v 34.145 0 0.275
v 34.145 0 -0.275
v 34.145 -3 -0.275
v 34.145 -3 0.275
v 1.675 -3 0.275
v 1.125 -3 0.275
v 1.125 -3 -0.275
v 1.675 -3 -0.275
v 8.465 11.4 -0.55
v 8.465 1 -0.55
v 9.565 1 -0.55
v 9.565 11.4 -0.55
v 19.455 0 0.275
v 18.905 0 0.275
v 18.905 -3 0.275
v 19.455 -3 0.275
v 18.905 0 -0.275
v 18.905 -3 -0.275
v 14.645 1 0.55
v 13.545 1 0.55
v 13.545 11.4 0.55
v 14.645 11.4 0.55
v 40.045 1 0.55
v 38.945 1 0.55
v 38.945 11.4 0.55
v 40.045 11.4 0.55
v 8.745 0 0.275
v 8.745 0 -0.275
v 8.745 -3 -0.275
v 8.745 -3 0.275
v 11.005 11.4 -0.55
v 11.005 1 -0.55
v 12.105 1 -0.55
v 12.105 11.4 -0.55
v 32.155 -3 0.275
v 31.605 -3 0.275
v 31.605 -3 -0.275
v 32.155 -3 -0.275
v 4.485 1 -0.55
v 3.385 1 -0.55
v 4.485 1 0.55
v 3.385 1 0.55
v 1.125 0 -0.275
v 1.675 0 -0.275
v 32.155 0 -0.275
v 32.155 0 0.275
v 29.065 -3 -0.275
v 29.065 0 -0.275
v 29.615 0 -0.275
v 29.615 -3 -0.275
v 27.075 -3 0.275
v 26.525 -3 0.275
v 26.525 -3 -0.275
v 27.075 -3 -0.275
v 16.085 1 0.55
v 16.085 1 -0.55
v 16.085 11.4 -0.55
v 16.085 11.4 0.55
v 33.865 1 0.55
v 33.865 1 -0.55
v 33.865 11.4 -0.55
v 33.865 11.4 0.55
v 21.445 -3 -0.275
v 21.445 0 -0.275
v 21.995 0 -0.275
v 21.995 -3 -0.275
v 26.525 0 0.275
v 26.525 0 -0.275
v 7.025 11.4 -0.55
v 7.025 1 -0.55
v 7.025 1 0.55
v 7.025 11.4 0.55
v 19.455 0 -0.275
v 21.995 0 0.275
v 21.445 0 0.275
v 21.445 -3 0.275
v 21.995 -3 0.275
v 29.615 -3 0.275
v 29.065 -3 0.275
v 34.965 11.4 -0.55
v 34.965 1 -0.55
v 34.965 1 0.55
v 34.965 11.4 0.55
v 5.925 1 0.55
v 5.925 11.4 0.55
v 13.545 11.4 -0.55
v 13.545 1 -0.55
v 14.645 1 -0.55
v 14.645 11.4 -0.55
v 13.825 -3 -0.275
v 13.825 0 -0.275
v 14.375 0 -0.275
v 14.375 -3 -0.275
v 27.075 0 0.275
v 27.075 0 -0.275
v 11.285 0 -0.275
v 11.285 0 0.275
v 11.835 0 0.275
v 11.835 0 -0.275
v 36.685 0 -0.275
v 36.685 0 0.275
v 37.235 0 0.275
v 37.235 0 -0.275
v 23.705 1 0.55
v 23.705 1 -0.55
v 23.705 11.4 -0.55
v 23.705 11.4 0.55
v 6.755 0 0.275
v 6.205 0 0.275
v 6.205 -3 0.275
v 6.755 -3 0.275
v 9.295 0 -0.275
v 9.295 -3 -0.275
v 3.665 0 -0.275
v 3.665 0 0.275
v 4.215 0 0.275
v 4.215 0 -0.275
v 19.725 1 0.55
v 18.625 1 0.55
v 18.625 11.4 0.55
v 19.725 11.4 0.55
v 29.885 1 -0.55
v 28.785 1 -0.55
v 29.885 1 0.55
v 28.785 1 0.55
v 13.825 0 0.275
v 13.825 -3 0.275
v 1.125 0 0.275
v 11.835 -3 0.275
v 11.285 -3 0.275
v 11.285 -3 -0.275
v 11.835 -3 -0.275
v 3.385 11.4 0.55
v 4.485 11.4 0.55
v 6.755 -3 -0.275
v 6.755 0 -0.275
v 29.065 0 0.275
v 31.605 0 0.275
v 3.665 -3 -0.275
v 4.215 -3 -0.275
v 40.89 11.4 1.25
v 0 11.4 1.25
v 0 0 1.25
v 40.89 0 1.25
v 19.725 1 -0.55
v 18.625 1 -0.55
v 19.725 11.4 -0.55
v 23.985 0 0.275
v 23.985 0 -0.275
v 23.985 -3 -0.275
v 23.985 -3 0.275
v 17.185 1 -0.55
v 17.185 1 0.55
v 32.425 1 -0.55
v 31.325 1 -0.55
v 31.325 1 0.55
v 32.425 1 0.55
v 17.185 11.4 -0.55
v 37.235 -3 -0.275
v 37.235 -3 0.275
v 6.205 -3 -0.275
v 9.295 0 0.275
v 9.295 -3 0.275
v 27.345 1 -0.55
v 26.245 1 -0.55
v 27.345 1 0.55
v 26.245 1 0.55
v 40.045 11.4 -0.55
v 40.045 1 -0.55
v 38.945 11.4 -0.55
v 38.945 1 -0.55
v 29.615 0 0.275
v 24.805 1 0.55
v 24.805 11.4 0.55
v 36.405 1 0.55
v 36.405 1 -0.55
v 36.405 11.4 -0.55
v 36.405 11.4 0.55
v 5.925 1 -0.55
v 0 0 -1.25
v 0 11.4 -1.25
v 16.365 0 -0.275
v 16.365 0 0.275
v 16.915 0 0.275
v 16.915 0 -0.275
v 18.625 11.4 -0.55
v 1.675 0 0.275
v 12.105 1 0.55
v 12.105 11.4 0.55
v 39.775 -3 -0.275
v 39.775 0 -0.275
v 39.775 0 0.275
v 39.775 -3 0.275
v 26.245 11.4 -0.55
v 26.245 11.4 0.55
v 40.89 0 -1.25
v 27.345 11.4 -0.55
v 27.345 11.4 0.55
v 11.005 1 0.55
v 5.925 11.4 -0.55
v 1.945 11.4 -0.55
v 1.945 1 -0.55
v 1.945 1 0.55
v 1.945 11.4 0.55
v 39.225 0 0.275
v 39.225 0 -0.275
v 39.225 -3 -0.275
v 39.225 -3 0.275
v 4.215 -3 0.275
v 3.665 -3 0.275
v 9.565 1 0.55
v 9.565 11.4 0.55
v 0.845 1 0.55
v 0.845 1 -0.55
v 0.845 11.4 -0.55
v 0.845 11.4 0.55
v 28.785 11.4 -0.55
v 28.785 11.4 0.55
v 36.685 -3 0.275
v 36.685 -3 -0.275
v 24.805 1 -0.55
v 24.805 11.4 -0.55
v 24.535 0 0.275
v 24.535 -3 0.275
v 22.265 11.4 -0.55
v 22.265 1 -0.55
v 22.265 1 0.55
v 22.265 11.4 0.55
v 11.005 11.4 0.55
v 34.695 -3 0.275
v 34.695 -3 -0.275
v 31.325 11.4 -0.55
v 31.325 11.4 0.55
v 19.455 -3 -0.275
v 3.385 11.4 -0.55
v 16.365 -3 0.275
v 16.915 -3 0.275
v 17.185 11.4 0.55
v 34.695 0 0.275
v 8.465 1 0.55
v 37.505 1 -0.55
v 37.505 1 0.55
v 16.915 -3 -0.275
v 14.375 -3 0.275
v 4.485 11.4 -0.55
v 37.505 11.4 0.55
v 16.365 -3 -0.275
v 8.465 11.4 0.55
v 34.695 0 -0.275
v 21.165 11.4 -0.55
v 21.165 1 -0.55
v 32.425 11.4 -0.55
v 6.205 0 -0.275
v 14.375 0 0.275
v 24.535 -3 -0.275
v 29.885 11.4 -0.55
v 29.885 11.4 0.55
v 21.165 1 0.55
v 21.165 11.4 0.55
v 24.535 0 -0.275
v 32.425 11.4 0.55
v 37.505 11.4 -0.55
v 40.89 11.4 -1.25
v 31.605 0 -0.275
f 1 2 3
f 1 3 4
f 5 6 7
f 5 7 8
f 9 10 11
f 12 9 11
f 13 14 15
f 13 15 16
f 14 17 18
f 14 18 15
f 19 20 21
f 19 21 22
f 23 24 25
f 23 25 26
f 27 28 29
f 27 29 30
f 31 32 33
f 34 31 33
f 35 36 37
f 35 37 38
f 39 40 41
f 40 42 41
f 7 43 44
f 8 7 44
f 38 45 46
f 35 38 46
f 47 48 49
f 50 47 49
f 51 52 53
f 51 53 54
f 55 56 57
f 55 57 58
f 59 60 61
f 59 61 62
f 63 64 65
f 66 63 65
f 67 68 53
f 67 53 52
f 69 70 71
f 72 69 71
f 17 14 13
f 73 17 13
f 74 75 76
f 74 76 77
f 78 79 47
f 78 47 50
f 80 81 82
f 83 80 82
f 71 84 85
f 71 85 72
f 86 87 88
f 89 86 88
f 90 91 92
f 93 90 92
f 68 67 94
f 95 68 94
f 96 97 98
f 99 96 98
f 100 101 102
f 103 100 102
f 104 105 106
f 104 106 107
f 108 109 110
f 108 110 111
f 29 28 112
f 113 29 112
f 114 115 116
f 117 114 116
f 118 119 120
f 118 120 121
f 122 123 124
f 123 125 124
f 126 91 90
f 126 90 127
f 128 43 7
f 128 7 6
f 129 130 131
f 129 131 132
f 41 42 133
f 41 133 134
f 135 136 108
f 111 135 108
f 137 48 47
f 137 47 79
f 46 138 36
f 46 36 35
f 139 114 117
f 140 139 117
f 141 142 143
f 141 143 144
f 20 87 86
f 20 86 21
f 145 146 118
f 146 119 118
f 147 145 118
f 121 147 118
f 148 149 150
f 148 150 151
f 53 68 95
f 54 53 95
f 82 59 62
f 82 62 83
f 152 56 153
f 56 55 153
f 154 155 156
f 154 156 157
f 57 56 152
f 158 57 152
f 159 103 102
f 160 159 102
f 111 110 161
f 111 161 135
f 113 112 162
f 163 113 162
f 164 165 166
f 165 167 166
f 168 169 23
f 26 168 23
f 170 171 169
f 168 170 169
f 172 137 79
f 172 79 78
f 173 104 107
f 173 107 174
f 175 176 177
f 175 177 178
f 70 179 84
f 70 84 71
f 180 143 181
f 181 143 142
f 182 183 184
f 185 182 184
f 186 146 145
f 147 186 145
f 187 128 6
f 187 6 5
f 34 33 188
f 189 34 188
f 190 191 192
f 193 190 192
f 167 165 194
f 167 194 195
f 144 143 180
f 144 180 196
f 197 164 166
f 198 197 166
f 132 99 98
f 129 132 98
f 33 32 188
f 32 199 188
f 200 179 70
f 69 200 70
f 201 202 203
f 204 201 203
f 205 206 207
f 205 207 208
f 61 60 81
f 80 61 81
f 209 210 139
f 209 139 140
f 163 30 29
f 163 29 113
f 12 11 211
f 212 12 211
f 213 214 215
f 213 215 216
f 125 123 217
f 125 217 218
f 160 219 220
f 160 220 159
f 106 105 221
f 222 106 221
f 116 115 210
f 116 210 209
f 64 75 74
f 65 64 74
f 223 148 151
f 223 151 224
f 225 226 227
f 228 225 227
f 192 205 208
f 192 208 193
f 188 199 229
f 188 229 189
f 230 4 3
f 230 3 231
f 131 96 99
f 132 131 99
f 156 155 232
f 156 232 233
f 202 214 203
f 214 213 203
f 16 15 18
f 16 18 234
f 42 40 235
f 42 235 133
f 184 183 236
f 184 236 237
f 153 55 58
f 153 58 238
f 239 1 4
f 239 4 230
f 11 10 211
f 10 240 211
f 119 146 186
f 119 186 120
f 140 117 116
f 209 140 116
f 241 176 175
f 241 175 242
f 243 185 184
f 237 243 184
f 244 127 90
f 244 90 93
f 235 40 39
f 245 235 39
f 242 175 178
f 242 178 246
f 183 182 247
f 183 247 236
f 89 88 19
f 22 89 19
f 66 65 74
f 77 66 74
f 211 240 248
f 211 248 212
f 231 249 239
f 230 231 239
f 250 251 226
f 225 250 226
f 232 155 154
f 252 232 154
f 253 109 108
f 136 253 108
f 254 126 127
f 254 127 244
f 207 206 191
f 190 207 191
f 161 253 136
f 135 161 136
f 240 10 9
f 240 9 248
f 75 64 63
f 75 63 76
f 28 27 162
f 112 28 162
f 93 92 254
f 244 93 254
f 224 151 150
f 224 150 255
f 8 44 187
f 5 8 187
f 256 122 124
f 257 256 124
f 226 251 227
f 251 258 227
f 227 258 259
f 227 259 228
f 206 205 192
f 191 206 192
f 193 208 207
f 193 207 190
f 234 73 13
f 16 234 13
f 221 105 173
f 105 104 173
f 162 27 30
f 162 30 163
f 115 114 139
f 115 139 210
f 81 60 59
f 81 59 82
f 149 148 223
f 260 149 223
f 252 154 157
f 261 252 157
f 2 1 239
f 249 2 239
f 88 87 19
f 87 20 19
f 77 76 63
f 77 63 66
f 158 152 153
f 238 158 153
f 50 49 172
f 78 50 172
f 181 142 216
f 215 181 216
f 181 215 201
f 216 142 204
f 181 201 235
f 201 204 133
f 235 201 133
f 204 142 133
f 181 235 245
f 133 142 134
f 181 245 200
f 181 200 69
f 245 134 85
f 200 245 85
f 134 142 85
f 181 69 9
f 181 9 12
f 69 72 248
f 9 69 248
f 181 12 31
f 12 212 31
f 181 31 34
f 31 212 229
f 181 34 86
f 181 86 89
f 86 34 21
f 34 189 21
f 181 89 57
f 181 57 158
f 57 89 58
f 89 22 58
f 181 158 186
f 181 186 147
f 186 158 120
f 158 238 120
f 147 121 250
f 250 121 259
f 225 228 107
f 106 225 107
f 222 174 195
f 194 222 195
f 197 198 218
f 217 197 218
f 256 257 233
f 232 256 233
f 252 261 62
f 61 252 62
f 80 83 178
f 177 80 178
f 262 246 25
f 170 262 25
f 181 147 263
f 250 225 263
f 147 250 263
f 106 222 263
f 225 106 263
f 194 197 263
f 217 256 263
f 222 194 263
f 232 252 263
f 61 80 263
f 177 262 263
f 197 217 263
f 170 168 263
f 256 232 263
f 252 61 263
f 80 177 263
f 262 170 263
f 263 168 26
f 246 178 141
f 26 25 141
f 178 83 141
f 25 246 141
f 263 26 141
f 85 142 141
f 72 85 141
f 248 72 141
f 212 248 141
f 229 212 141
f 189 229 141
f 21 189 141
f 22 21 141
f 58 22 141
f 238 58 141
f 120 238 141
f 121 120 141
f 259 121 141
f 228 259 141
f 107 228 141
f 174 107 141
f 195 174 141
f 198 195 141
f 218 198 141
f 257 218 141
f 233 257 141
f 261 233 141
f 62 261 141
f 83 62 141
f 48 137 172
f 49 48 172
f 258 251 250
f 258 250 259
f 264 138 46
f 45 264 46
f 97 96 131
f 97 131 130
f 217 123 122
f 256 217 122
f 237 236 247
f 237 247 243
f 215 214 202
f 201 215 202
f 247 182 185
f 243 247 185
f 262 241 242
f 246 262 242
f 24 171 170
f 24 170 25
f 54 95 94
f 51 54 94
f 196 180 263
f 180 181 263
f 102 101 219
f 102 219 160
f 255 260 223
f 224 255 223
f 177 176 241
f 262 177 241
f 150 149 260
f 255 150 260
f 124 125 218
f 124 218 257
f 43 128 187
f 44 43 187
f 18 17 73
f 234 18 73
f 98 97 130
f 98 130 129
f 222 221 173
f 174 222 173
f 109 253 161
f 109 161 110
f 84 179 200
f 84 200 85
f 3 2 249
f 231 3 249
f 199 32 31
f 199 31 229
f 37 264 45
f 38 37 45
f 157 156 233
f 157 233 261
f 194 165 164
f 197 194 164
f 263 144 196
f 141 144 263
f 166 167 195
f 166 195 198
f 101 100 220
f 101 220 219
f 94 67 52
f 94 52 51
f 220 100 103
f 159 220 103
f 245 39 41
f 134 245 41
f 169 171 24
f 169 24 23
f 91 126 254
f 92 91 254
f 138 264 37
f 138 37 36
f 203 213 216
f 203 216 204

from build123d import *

# Parameters (mm, degrees)
SKETCH1_W              = 40.89
SKETCH1_H              = 11.4
BOSS_EXTRUDE1_DEPTH    = 1.25
SKETCH2_W              = 1.1
SKETCH2_H              = 1.1
CUT_EXTRUDE1_DEPTH     = 12.4
SKETCH3_W              = 40.89
SKETCH3_H              = 2.5
BOSS_EXTRUDE2_DEPTH    = 1
SKETCH4_W              = 0.55
SKETCH4_H              = 0.55
BOSS_EXTRUDE3_DEPTH    = 3
BOSS_EXTRUDE3_2_DEPTH  = 3
BOSS_EXTRUDE3_3_DEPTH  = 3
BOSS_EXTRUDE3_4_DEPTH  = 3
BOSS_EXTRUDE3_5_DEPTH  = 3
BOSS_EXTRUDE3_6_DEPTH  = 3
BOSS_EXTRUDE3_7_DEPTH  = 3
BOSS_EXTRUDE3_8_DEPTH  = 3
BOSS_EXTRUDE3_9_DEPTH  = 3
BOSS_EXTRUDE3_10_DEPTH = 3
BOSS_EXTRUDE3_11_DEPTH = 3
BOSS_EXTRUDE3_12_DEPTH = 3
BOSS_EXTRUDE3_13_DEPTH = 3
BOSS_EXTRUDE3_14_DEPTH = 3
BOSS_EXTRUDE3_15_DEPTH = 3
BOSS_EXTRUDE3_16_DEPTH = 3


with BuildPart() as part:
    # Sketch1 → Boss-Extrude1 (new body, symmetric)
    with BuildSketch(Plane.XY):
        with Locations((20.445, 5.7)):
            Rectangle(SKETCH1_W, SKETCH1_H)
    extrude(amount=BOSS_EXTRUDE1_DEPTH, both=True)

    # Sketch2 → Cut-Extrude1 (cut, through all)
    with BuildSketch(Plane.XZ):
        with Locations((1.395, 0)):
            Rectangle(SKETCH2_W, SKETCH2_H)
        with Locations((3.935, 0)):
            Rectangle(SKETCH2_W, SKETCH2_H)
        with Locations((6.475, 0)):
            Rectangle(SKETCH2_W, SKETCH2_H)
        with Locations((9.015, 0)):
            Rectangle(SKETCH2_W, SKETCH2_H)
        with Locations((11.555, 0)):
            Rectangle(SKETCH2_W, SKETCH2_H)
        with Locations((14.095, 0)):
            Rectangle(SKETCH2_W, SKETCH2_H)
        with Locations((16.635, 0)):
            Rectangle(SKETCH2_W, SKETCH2_H)
        with Locations((39.495, 0)):
            Rectangle(SKETCH2_W, SKETCH2_H)
        with Locations((36.955, 0)):
            Rectangle(SKETCH2_W, SKETCH2_H)
        with Locations((34.415, 0)):
            Rectangle(SKETCH2_W, SKETCH2_H)
        with Locations((31.875, 0)):
            Rectangle(SKETCH2_W, SKETCH2_H)
        with Locations((29.335, 0)):
            Rectangle(SKETCH2_W, SKETCH2_H)
        with Locations((26.795, 0)):
            Rectangle(SKETCH2_W, SKETCH2_H)
        with Locations((24.255, 0)):
            Rectangle(SKETCH2_W, SKETCH2_H)
        with Locations((21.715, 0)):
            Rectangle(SKETCH2_W, SKETCH2_H)
        with Locations((19.175, 0)):
            Rectangle(SKETCH2_W, SKETCH2_H)
    extrude(amount=-CUT_EXTRUDE1_DEPTH, mode=Mode.SUBTRACT)

    # Sketch3 → Boss-Extrude2 (add)
    with BuildSketch(Plane.XZ):
        with Locations((20.445, 0)):
            Rectangle(SKETCH3_W, SKETCH3_H)
    extrude(amount=-BOSS_EXTRUDE2_DEPTH)


with BuildPart() as body_2:
    # Sketch4 → Boss-Extrude3 (new body)
    with BuildSketch(Plane.XZ):
        with Locations((1.4, 0)):
            Rectangle(SKETCH4_W, SKETCH4_H)
    extrude(amount=BOSS_EXTRUDE3_DEPTH)


with BuildPart() as body_3:
    # Sketch4 → Boss-Extrude3 2 (new body)
    with BuildSketch(Plane.XZ):
        with Locations((3.94, 0)):
            Rectangle(SKETCH4_W, SKETCH4_H)
    extrude(amount=BOSS_EXTRUDE3_2_DEPTH)


with BuildPart() as body_4:
    # Sketch4 → Boss-Extrude3 3 (new body)
    with BuildSketch(Plane.XZ):
        with Locations((6.48, 0)):
            Rectangle(SKETCH4_W, SKETCH4_H)
    extrude(amount=BOSS_EXTRUDE3_3_DEPTH)


with BuildPart() as body_5:
    # Sketch4 → Boss-Extrude3 4 (new body)
    with BuildSketch(Plane.XZ):
        with Locations((9.02, 0)):
            Rectangle(SKETCH4_W, SKETCH4_H)
    extrude(amount=BOSS_EXTRUDE3_4_DEPTH)


with BuildPart() as body_6:
    # Sketch4 → Boss-Extrude3 5 (new body)
    with BuildSketch(Plane.XZ):
        with Locations((11.56, 0)):
            Rectangle(SKETCH4_W, SKETCH4_H)
    extrude(amount=BOSS_EXTRUDE3_5_DEPTH)


with BuildPart() as body_7:
    # Sketch4 → Boss-Extrude3 6 (new body)
    with BuildSketch(Plane.XZ):
        with Locations((14.1, 0)):
            Rectangle(SKETCH4_W, SKETCH4_H)
    extrude(amount=BOSS_EXTRUDE3_6_DEPTH)


with BuildPart() as body_8:
    # Sketch4 → Boss-Extrude3 7 (new body)
    with BuildSketch(Plane.XZ):
        with Locations((16.64, 0)):
            Rectangle(SKETCH4_W, SKETCH4_H)
    extrude(amount=BOSS_EXTRUDE3_7_DEPTH)


with BuildPart() as body_9:
    # Sketch4 → Boss-Extrude3 8 (new body)
    with BuildSketch(Plane.XZ):
        with Locations((19.18, 0)):
            Rectangle(SKETCH4_W, SKETCH4_H)
    extrude(amount=BOSS_EXTRUDE3_8_DEPTH)


with BuildPart() as body_10:
    # Sketch4 → Boss-Extrude3 9 (new body)
    with BuildSketch(Plane.XZ):
        with Locations((21.72, 0)):
            Rectangle(SKETCH4_W, SKETCH4_H)
    extrude(amount=BOSS_EXTRUDE3_9_DEPTH)


with BuildPart() as body_11:
    # Sketch4 → Boss-Extrude3 10 (new body)
    with BuildSketch(Plane.XZ):
        with Locations((24.26, 0)):
            Rectangle(SKETCH4_W, SKETCH4_H)
    extrude(amount=BOSS_EXTRUDE3_10_DEPTH)


with BuildPart() as body_12:
    # Sketch4 → Boss-Extrude3 11 (new body)
    with BuildSketch(Plane.XZ):
        with Locations((26.8, 0)):
            Rectangle(SKETCH4_W, SKETCH4_H)
    extrude(amount=BOSS_EXTRUDE3_11_DEPTH)


with BuildPart() as body_13:
    # Sketch4 → Boss-Extrude3 12 (new body)
    with BuildSketch(Plane.XZ):
        with Locations((29.34, 0)):
            Rectangle(SKETCH4_W, SKETCH4_H)
    extrude(amount=BOSS_EXTRUDE3_12_DEPTH)


with BuildPart() as body_14:
    # Sketch4 → Boss-Extrude3 13 (new body)
    with BuildSketch(Plane.XZ):
        with Locations((31.88, 0)):
            Rectangle(SKETCH4_W, SKETCH4_H)
    extrude(amount=BOSS_EXTRUDE3_13_DEPTH)


with BuildPart() as body_15:
    # Sketch4 → Boss-Extrude3 14 (new body)
    with BuildSketch(Plane.XZ):
        with Locations((34.42, 0)):
            Rectangle(SKETCH4_W, SKETCH4_H)
    extrude(amount=BOSS_EXTRUDE3_14_DEPTH)


with BuildPart() as body_16:
    # Sketch4 → Boss-Extrude3 15 (new body)
    with BuildSketch(Plane.XZ):
        with Locations((36.96, 0)):
            Rectangle(SKETCH4_W, SKETCH4_H)
    extrude(amount=BOSS_EXTRUDE3_15_DEPTH)


with BuildPart() as body_17:
    # Sketch4 → Boss-Extrude3 16 (new body)
    with BuildSketch(Plane.XZ):
        with Locations((39.5, 0)):
            Rectangle(SKETCH4_W, SKETCH4_H)
    extrude(amount=BOSS_EXTRUDE3_16_DEPTH)


solid = Compound([part.part, body_2.part, body_3.part, body_4.part, body_5.part, body_6.part, body_7.part, body_8.part, body_9.part, body_10.part, body_11.part, body_12.part, body_13.part, body_14.part, body_15.part, body_16.part, body_17.part])
